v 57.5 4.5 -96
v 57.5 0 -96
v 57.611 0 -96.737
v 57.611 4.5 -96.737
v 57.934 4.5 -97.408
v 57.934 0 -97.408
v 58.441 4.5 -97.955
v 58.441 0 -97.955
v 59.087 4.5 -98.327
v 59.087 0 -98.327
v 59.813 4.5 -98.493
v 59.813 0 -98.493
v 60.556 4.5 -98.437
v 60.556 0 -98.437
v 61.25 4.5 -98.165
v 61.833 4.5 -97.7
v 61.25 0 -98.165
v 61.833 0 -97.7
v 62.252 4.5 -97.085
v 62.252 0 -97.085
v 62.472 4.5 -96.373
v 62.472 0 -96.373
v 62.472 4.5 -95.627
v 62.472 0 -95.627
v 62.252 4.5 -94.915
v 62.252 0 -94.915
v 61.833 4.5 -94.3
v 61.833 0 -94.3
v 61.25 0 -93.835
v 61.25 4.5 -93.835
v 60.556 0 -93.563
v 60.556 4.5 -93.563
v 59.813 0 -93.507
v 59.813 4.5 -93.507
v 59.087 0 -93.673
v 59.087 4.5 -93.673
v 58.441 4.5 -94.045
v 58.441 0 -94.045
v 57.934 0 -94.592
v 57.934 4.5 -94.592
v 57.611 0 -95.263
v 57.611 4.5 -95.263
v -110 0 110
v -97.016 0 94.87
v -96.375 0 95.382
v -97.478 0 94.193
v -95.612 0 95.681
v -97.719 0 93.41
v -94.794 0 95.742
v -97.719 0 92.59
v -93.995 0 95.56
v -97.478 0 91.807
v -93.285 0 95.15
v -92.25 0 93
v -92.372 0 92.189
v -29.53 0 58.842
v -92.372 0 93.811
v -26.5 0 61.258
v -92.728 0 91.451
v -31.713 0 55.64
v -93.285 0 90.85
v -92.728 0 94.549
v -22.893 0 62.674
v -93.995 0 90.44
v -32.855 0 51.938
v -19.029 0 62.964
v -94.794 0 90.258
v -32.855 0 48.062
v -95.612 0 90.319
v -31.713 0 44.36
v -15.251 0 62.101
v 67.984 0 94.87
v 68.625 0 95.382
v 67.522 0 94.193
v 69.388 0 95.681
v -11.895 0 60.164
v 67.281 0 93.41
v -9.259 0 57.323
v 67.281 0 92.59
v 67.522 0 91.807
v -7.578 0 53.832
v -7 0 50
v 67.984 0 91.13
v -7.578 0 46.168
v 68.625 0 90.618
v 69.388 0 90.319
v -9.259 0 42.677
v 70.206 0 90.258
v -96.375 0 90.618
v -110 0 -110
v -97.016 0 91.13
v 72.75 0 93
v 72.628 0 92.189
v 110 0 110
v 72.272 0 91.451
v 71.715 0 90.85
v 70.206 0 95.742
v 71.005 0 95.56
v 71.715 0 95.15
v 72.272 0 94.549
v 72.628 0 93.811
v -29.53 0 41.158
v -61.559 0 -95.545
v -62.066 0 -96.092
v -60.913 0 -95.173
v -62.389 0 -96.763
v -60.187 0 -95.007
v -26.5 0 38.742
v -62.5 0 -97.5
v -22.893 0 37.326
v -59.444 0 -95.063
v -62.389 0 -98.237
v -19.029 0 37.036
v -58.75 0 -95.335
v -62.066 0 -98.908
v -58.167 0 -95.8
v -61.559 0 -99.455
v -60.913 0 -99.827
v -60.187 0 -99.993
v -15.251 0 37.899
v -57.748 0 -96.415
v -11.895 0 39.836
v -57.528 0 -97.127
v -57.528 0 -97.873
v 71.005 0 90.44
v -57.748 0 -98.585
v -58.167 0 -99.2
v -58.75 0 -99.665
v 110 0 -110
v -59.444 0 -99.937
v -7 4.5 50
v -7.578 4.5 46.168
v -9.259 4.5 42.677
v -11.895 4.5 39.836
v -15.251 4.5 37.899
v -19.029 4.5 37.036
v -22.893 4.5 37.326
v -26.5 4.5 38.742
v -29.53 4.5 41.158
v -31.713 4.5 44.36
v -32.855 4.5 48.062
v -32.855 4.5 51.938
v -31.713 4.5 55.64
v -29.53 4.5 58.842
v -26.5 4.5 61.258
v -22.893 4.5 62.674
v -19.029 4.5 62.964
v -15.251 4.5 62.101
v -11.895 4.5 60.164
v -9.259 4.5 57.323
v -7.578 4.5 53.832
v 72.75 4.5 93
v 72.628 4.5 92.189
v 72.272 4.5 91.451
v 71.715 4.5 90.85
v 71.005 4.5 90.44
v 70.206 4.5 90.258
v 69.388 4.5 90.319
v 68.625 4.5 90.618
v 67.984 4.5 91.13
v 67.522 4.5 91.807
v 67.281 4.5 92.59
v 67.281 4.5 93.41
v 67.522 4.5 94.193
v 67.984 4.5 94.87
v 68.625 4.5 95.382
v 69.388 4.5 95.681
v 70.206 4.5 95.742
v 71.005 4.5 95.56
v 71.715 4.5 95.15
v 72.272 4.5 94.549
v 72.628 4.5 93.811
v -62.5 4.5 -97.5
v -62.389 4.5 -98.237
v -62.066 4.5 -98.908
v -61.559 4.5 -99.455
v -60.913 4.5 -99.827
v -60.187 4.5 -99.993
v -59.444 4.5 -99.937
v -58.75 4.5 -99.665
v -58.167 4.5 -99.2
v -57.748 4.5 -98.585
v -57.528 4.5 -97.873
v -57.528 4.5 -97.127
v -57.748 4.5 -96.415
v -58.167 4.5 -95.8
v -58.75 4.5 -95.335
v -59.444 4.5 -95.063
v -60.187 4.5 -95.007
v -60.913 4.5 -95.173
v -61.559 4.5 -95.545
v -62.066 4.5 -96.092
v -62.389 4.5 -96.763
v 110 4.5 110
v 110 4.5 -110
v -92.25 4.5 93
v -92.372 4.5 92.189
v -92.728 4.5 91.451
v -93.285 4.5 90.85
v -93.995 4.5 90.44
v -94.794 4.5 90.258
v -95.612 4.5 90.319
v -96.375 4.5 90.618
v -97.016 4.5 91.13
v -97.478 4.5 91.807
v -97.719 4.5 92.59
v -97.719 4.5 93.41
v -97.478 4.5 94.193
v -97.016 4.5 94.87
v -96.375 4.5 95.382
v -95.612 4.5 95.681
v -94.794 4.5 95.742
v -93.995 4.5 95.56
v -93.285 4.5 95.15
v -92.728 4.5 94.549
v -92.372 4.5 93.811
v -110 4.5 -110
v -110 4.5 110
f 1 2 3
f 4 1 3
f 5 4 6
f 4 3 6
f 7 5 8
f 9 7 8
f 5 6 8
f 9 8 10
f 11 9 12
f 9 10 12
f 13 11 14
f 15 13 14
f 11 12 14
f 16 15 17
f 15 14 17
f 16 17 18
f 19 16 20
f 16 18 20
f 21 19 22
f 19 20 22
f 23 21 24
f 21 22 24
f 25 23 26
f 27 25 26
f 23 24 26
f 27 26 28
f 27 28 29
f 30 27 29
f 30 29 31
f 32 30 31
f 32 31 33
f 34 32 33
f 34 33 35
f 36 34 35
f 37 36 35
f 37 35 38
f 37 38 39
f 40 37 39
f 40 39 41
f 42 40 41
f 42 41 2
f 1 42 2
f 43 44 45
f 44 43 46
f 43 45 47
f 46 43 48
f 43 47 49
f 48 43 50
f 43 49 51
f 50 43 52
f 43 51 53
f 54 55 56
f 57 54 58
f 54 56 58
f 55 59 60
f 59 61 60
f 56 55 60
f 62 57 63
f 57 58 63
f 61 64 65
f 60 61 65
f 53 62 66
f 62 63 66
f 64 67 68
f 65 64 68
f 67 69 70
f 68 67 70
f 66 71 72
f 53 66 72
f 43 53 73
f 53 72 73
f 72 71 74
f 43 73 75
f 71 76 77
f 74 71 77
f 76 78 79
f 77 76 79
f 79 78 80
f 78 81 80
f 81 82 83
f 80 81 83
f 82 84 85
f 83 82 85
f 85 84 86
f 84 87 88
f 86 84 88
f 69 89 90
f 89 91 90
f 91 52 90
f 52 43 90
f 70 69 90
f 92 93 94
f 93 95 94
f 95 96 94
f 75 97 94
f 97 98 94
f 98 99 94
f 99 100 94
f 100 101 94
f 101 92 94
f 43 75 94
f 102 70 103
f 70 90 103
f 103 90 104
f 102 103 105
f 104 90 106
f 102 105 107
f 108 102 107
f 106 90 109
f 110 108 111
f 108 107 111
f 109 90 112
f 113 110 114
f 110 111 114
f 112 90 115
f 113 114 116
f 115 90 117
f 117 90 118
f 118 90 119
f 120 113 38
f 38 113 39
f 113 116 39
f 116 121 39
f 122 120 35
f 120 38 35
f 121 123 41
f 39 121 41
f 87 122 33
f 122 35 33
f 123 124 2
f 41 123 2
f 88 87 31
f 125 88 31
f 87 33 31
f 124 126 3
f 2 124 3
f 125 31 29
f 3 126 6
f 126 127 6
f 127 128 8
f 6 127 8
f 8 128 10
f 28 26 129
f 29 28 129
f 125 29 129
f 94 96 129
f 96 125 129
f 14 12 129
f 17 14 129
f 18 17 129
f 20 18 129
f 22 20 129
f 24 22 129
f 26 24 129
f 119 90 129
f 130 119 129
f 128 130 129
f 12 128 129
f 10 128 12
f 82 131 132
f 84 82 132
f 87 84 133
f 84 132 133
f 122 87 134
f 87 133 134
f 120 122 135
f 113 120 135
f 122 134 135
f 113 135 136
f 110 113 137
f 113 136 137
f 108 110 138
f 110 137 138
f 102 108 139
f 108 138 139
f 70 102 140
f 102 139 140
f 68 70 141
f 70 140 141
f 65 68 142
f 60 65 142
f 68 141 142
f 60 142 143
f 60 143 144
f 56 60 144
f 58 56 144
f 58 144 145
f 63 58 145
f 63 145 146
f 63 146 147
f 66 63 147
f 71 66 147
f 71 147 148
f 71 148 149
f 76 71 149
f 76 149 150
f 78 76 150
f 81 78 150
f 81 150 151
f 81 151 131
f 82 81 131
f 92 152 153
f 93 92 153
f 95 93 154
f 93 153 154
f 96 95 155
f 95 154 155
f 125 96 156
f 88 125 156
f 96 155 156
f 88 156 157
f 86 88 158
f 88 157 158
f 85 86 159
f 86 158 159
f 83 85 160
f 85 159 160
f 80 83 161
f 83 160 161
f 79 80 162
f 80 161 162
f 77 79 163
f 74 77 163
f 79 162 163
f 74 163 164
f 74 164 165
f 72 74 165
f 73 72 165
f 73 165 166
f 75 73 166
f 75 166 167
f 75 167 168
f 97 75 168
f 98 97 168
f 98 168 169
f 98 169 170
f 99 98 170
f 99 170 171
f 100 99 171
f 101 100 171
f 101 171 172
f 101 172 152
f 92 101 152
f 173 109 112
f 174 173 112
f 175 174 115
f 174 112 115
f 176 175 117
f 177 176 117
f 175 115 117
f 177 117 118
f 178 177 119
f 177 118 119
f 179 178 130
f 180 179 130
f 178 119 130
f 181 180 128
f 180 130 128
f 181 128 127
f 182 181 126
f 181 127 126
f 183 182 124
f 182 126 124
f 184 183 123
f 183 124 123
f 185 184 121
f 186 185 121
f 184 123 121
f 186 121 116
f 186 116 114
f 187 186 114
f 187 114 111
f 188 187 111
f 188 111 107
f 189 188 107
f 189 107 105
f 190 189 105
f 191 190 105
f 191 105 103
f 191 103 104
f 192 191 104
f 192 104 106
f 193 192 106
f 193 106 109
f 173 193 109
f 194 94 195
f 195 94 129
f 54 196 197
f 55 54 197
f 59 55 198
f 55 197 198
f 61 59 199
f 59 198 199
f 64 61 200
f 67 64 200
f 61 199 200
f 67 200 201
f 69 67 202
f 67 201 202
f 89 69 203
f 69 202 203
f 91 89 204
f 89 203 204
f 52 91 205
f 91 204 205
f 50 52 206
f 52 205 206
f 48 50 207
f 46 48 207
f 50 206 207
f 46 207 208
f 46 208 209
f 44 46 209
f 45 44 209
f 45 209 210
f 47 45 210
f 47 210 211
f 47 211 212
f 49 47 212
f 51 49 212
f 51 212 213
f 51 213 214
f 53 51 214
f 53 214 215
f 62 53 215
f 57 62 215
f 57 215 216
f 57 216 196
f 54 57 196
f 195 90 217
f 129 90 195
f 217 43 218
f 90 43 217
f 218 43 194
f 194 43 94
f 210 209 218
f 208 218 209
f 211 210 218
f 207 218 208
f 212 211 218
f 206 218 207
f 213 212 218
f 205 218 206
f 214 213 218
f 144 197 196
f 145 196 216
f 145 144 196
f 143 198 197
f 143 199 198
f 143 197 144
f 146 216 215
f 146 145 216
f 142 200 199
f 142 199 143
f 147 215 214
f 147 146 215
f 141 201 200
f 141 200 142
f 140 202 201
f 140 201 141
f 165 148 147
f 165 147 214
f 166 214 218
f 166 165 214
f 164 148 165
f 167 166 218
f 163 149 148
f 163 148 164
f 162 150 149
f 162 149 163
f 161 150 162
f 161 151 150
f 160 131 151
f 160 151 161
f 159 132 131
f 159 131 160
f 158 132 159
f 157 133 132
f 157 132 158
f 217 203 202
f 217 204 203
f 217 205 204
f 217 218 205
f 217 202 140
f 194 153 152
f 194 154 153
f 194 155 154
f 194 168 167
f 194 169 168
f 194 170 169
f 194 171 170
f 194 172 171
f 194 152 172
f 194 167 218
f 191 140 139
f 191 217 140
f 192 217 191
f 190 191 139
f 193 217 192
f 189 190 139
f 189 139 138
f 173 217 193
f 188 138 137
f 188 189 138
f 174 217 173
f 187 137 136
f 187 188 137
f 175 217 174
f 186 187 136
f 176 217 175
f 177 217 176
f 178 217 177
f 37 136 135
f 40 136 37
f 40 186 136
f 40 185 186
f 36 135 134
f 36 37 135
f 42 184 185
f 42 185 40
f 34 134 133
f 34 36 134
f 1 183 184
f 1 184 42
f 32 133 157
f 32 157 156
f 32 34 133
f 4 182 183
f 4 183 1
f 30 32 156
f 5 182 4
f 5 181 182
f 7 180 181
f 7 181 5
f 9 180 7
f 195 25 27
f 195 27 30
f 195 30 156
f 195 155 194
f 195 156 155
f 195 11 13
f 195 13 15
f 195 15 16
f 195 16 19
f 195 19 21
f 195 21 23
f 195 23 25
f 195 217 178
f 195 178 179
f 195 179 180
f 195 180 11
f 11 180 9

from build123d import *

# Parameters (mm, degrees)
SKETCH1_W           = 220
SKETCH1_H           = 220
BOSS_EXTRUDE1_DEPTH = 4.5
CUT_EXTRUDE1_REACH  = 6.5
SKETCH2_R           = 13
CUT_EXTRUDE2_REACH  = 6.5
SKETCH3_R           = 2.75
CUT_EXTRUDE3_REACH  = 6.5
SKETCH4_R           = 2.5


with BuildPart() as part:
    # Sketch1 → Boss-Extrude1 (new body)
    with BuildSketch(Plane(origin=(0, 0, 0), x_dir=(1, 0, 0), z_dir=(0, 1, 0))):
        Rectangle(SKETCH1_W, SKETCH1_H)
    extrude(amount=BOSS_EXTRUDE1_DEPTH)

    # Sketch2 → Cut-Extrude1 (cut, up to next)
    with BuildSketch(Plane(origin=(0, 4.5, 0), x_dir=(1, 0, 0), z_dir=(0, 1, 0)), mode=Mode.PRIVATE) as cut_extrude1_sk1:
        with Locations((-20, -50)):
            Circle(SKETCH2_R)
    cut_extrude1_tool1 = extrude(cut_extrude1_sk1.sketch, amount=-CUT_EXTRUDE1_REACH, mode=Mode.PRIVATE) & part.part
    add(cut_extrude1_tool1.solids().sort_by_distance((-20, 4.5, 50))[0], mode=Mode.SUBTRACT)

    # Sketch3 → Cut-Extrude2 (cut, up to next)
    with BuildSketch(Plane(origin=(0, 4.5, 0), x_dir=(1, 0, 0), z_dir=(0, 1, 0)), mode=Mode.PRIVATE) as cut_extrude2_sk1:
        with Locations((-95, -93)):
            Circle(SKETCH3_R)
    cut_extrude2_tool1 = extrude(cut_extrude2_sk1.sketch, amount=-CUT_EXTRUDE2_REACH, mode=Mode.PRIVATE) & part.part
    add(cut_extrude2_tool1.solids().sort_by_distance((-95, 4.5, 93))[0], mode=Mode.SUBTRACT)
    # Sketch3 → Cut-Extrude2 (cut, up to next)
    with BuildSketch(Plane(origin=(0, 4.5, 0), x_dir=(1, 0, 0), z_dir=(0, 1, 0)), mode=Mode.PRIVATE) as cut_extrude2_sk2:
        with Locations((70, -93)):
            Circle(SKETCH3_R)
    cut_extrude2_tool2 = extrude(cut_extrude2_sk2.sketch, amount=-CUT_EXTRUDE2_REACH, mode=Mode.PRIVATE) & part.part
    add(cut_extrude2_tool2.solids().sort_by_distance((70, 4.5, 93))[0], mode=Mode.SUBTRACT)

    # Sketch4 → Cut-Extrude3 (cut, up to next)
    with BuildSketch(Plane(origin=(0, 0, 0), x_dir=(-1, 0, 0), z_dir=(0, -1, 0)), mode=Mode.PRIVATE) as cut_extrude3_sk1:
        with Locations((-60, 96)):
            Circle(SKETCH4_R)
    cut_extrude3_tool1 = extrude(cut_extrude3_sk1.sketch, amount=-CUT_EXTRUDE3_REACH, mode=Mode.PRIVATE) & part.part
    add(cut_extrude3_tool1.solids().sort_by_distance((60, 0, -96))[0], mode=Mode.SUBTRACT)
    # Sketch4 → Cut-Extrude3 (cut, up to next)
    with BuildSketch(Plane(origin=(0, 0, 0), x_dir=(-1, 0, 0), z_dir=(0, -1, 0)), mode=Mode.PRIVATE) as cut_extrude3_sk2:
        with Locations((60, 97.5)):
            Circle(SKETCH4_R)
    cut_extrude3_tool2 = extrude(cut_extrude3_sk2.sketch, amount=-CUT_EXTRUDE3_REACH, mode=Mode.PRIVATE) & part.part
    add(cut_extrude3_tool2.solids().sort_by_distance((-60, 0, -97.5))[0], mode=Mode.SUBTRACT)


solid = part.part
